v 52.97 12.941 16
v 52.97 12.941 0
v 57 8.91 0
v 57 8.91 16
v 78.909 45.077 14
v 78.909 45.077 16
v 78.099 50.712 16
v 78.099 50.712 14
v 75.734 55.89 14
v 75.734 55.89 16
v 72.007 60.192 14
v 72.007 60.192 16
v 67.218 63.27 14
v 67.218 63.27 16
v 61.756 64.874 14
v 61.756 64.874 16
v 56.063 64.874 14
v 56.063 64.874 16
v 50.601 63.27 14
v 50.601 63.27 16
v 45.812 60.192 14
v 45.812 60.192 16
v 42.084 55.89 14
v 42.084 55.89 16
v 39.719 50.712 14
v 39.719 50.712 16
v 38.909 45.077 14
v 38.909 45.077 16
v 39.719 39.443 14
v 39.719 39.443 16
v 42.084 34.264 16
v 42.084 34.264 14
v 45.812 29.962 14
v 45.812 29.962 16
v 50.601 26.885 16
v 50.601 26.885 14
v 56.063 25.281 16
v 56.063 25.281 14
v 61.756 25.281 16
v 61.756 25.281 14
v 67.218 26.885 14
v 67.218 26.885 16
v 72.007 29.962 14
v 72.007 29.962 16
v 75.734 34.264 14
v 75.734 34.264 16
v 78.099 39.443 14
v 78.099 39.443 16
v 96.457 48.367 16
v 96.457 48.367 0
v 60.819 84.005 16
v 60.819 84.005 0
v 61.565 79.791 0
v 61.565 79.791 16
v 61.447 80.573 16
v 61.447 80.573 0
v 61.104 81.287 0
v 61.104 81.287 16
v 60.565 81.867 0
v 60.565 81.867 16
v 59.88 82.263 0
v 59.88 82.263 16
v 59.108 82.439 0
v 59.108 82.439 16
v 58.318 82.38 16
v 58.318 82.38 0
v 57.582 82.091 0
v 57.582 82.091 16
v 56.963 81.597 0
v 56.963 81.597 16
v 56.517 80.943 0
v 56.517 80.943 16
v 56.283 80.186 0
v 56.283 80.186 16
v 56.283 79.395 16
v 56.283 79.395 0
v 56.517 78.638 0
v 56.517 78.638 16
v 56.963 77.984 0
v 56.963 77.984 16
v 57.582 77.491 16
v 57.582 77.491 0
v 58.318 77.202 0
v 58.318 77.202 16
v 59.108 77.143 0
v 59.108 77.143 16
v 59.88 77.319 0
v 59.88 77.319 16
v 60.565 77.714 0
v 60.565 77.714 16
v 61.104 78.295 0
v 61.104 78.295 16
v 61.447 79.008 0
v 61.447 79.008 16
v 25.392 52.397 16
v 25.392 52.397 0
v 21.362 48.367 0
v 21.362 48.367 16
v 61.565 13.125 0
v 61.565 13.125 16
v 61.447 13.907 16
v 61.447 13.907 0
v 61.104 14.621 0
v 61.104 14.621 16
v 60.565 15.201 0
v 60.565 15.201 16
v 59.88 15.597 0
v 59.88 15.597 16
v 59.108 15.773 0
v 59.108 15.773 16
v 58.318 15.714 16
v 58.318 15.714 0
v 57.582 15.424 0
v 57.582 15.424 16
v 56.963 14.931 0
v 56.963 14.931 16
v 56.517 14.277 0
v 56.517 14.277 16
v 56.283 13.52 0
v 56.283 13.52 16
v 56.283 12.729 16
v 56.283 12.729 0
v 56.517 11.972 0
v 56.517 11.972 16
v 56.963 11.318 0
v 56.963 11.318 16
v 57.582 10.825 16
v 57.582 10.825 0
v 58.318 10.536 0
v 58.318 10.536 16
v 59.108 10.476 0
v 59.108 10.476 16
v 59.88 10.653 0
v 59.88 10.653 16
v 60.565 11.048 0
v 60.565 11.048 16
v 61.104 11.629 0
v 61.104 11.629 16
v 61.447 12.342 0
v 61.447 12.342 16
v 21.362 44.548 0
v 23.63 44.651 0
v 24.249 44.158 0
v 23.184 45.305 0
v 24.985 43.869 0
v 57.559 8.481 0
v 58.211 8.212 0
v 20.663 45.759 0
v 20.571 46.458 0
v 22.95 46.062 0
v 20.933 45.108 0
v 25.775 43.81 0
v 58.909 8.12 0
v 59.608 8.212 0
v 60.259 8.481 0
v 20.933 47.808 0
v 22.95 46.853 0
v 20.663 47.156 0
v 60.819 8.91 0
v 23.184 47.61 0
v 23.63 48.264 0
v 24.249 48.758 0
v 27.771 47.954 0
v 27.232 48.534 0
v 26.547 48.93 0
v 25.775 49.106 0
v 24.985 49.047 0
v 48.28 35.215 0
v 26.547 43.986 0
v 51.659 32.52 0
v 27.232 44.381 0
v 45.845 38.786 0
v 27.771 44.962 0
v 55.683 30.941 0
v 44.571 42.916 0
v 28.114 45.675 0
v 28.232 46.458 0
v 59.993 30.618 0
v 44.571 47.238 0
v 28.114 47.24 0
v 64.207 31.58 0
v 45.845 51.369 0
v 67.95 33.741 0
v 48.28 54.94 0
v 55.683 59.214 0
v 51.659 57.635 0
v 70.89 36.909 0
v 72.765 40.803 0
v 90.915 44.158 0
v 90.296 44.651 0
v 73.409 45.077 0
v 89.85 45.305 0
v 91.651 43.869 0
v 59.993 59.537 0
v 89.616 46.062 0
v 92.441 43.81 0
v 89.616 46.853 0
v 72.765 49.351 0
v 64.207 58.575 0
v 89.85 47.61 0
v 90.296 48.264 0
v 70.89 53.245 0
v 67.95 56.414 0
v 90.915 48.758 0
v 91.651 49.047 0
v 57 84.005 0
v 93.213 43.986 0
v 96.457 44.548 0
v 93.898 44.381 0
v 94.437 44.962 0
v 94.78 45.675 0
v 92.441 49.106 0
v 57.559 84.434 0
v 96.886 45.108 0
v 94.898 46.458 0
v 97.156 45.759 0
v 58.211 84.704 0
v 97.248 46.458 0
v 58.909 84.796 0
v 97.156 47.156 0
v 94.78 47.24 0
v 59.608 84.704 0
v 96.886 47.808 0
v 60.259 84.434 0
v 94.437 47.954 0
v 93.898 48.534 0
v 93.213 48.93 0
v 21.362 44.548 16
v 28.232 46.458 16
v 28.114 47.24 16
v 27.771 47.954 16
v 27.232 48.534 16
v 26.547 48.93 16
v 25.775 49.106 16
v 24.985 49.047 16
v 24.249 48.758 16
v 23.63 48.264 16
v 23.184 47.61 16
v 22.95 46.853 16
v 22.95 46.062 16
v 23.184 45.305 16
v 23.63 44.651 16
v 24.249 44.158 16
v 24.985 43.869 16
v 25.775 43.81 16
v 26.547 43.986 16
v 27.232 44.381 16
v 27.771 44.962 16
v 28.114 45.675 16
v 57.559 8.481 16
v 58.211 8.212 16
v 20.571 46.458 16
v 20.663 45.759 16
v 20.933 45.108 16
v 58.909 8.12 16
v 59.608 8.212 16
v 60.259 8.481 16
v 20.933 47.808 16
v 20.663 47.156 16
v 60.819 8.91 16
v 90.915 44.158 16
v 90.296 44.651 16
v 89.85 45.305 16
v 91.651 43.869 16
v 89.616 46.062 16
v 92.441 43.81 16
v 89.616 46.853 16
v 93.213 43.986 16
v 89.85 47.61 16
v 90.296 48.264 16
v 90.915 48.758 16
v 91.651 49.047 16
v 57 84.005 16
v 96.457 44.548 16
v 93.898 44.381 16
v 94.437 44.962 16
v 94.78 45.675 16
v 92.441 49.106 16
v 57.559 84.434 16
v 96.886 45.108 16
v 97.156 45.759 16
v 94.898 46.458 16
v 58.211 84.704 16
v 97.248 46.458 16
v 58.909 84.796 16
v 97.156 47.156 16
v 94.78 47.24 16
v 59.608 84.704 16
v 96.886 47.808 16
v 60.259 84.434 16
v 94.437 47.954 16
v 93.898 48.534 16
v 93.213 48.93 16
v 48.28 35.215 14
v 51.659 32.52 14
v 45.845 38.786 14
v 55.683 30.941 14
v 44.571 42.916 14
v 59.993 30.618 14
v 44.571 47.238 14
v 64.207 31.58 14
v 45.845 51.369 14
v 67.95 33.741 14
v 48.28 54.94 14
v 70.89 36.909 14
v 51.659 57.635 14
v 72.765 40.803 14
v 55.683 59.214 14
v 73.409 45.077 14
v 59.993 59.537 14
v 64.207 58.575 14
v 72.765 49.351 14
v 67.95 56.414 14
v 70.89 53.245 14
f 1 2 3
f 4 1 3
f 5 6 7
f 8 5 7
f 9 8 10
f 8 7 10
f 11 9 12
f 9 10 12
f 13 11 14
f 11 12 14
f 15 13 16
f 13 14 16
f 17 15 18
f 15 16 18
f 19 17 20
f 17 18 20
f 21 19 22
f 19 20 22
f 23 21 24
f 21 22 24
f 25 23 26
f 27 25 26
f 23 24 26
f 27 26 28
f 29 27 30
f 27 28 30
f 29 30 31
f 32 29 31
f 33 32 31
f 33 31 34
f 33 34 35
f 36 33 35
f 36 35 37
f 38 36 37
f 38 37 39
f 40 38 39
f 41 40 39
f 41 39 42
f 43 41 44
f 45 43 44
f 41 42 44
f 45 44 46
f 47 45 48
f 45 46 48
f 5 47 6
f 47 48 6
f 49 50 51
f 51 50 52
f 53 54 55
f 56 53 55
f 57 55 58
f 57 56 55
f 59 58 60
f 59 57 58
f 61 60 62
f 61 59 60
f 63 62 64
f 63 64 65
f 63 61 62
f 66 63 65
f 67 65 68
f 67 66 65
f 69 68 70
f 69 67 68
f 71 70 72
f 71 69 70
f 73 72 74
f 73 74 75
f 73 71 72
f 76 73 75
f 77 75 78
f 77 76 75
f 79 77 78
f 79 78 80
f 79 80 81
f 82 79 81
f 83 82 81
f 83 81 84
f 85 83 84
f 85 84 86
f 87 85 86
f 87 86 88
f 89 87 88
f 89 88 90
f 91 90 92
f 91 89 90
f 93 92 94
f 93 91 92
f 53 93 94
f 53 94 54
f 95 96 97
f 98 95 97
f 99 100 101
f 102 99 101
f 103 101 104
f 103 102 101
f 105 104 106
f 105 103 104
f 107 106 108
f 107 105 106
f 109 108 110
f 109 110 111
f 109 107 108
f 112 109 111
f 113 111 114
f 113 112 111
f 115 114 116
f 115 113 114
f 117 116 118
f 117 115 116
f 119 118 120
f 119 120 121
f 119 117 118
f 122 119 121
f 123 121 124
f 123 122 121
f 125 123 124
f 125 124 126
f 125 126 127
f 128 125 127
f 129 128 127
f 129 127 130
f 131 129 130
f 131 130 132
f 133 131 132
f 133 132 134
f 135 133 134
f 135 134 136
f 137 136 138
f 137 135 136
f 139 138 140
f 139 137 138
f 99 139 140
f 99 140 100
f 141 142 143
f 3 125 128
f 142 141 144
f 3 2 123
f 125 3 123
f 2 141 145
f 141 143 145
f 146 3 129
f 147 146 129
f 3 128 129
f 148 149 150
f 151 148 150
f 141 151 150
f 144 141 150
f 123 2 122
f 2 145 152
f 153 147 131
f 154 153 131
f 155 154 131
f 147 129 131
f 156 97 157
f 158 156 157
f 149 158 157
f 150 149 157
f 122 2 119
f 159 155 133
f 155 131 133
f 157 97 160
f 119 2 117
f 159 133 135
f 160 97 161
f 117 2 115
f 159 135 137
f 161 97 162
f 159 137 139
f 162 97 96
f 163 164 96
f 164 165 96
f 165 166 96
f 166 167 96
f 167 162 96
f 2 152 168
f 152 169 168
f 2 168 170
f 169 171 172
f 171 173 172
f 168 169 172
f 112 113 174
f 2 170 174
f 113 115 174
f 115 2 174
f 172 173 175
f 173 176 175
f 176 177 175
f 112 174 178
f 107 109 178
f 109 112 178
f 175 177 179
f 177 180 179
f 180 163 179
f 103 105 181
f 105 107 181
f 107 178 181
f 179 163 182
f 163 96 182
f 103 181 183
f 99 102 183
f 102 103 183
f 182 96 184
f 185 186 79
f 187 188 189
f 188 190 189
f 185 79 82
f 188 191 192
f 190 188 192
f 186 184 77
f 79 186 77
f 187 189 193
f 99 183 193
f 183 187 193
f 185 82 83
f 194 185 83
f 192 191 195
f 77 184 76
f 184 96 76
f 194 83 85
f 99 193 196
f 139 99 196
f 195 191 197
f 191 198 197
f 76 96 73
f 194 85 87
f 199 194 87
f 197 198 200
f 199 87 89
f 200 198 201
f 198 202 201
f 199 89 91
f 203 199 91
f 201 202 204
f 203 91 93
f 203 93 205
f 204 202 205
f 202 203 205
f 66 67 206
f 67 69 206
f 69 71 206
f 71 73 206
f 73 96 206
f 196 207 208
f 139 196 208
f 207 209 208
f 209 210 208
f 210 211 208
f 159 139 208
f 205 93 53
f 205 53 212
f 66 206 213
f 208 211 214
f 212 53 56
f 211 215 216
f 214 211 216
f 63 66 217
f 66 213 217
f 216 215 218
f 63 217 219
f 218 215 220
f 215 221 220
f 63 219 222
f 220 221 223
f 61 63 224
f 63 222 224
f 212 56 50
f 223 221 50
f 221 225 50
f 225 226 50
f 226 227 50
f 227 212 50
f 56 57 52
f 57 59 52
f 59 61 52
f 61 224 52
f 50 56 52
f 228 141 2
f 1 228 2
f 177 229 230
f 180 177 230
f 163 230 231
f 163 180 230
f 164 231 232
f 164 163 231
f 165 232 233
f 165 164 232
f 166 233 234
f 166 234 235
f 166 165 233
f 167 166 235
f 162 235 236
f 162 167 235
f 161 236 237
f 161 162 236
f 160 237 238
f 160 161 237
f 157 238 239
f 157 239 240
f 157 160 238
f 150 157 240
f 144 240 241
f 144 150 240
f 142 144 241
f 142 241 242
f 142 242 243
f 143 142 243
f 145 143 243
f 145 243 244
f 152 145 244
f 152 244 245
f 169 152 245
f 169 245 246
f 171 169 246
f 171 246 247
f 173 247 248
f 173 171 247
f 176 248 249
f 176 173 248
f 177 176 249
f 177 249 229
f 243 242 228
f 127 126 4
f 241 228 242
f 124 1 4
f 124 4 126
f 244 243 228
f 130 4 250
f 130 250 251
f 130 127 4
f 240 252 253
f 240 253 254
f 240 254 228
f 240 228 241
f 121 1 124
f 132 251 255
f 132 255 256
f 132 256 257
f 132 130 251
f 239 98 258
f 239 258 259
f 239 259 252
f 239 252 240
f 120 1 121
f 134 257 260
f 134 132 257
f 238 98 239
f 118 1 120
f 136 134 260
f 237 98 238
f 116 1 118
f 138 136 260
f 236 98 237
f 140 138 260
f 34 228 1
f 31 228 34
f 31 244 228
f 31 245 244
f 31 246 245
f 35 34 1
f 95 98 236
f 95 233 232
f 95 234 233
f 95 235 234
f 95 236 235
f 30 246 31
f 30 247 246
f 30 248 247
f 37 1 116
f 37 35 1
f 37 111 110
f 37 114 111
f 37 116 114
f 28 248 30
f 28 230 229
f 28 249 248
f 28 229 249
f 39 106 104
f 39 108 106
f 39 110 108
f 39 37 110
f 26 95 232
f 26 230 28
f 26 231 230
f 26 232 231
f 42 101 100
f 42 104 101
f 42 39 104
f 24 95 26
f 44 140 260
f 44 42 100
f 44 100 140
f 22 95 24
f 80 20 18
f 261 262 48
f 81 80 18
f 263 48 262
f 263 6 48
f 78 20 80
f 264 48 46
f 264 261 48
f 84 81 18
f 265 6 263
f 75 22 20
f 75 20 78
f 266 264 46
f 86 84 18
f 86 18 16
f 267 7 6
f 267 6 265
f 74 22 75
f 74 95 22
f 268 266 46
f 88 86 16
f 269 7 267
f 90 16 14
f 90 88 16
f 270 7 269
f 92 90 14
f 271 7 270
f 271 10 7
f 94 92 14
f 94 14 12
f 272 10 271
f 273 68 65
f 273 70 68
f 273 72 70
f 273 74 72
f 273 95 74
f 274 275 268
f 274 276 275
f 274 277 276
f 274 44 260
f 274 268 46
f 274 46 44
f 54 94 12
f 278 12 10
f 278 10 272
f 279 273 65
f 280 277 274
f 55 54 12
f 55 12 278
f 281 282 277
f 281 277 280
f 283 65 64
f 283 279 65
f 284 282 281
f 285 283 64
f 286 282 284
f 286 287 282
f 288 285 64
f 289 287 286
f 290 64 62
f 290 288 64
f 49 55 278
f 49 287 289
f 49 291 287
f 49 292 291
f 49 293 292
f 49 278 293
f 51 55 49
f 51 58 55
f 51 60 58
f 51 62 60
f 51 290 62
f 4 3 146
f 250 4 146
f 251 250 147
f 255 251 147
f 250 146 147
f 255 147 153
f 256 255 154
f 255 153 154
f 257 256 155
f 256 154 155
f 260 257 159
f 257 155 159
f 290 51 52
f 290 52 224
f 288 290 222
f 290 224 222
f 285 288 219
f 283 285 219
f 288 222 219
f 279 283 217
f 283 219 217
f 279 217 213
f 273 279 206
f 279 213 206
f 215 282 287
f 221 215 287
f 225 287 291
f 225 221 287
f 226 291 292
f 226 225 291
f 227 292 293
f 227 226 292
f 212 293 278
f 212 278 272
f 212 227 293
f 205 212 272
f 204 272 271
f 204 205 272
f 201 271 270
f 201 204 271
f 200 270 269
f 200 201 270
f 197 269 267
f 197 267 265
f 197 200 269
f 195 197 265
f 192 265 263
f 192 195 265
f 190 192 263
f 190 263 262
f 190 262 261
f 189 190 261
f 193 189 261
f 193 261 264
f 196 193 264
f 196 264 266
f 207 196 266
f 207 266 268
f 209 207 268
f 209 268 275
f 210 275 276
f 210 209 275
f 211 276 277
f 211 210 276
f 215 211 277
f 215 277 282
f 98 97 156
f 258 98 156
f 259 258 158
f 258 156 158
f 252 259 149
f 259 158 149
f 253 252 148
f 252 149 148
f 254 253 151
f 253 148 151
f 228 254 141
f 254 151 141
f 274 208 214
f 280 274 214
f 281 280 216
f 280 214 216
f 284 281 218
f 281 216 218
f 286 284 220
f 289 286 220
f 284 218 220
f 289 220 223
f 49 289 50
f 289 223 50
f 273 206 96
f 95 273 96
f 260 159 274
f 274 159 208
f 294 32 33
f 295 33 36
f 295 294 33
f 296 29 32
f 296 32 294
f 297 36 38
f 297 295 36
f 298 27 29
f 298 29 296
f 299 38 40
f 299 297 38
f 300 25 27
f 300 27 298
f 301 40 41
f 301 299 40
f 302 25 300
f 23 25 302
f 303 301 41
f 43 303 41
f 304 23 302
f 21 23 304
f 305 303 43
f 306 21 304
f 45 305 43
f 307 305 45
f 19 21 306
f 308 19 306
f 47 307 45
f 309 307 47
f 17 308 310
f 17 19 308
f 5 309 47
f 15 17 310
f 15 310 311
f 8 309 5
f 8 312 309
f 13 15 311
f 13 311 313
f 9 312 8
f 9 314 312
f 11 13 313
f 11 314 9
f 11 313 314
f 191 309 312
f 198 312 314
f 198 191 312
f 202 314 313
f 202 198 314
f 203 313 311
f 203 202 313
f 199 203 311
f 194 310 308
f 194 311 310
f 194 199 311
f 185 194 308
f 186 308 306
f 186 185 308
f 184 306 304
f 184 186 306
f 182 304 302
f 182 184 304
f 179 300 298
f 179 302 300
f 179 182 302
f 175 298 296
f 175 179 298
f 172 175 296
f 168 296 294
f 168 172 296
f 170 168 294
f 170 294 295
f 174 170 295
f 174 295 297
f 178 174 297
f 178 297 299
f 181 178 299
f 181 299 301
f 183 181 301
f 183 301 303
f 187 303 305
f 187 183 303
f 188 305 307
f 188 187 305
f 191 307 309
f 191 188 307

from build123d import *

# Parameters (mm, degrees)
SKETCH1_R           = 14.5
SKETCH1_R_2         = 2.655602963
BOSS_EXTRUDE1_DEPTH = 16
SKETCH2_R           = 20
CUT_EXTRUDE1_DEPTH  = 2


with BuildPart() as part:
    # Sketch1 → Boss-Extrude1 (new body)
    with BuildSketch(Plane.XY):
        with BuildLine():
            Line((96.456721684, 48.36687177), (64.849048565, 79.974544889))
            Line((64.849048565, 79.974544889), (60.818539912, 84.005053542))
            ThreePointArc((60.818539912, 84.005053542), (58.909351603, 84.795865233), (57.000163293, 84.005053542))
            Line((57.000163293, 84.005053542), (25.392490174, 52.397380423))
            Line((25.392490174, 52.397380423), (21.361981522, 48.36687177))
            ThreePointArc((21.361981522, 48.36687177), (20.571169831, 46.457683461), (21.361981522, 44.548495152))
            Line((21.361981522, 44.548495152), (52.969654641, 12.940822033))
            Line((52.969654641, 12.940822033), (57.000163293, 8.91031338))
            ThreePointArc((57.000163293, 8.91031338), (58.909351603, 8.119501689), (60.818539912, 8.91031338))
            Line((60.818539912, 8.91031338), (92.426213031, 40.517986499))
            Line((92.426213031, 40.517986499), (96.456721684, 44.548495152))
            ThreePointArc((96.456721684, 44.548495152), (97.247533374, 46.457683461), (96.456721684, 48.36687177))
        make_face()
        with Locations((58.909351603, 45.077265813)):
            Circle(SKETCH1_R, mode=Mode.SUBTRACT)
        with Locations((58.909351603, 13.124669796)):
            Circle(SKETCH1_R_2, mode=Mode.SUBTRACT)
        with Locations((92.242365268, 46.457683461)):
            Circle(SKETCH1_R_2, mode=Mode.SUBTRACT)
        with Locations((58.909351603, 79.790697126)):
            Circle(SKETCH1_R_2, mode=Mode.SUBTRACT)
        with Locations((25.576337937, 46.457683461)):
            Circle(SKETCH1_R_2, mode=Mode.SUBTRACT)
    extrude(amount=BOSS_EXTRUDE1_DEPTH)

    # Sketch2 → Cut-Extrude1 (cut)
    with BuildSketch(Plane.XY.offset(16)):
        with Locations((58.909351603, 45.077265813)):
            Circle(SKETCH2_R)
    extrude(amount=-CUT_EXTRUDE1_DEPTH, mode=Mode.SUBTRACT)


solid = part.part
